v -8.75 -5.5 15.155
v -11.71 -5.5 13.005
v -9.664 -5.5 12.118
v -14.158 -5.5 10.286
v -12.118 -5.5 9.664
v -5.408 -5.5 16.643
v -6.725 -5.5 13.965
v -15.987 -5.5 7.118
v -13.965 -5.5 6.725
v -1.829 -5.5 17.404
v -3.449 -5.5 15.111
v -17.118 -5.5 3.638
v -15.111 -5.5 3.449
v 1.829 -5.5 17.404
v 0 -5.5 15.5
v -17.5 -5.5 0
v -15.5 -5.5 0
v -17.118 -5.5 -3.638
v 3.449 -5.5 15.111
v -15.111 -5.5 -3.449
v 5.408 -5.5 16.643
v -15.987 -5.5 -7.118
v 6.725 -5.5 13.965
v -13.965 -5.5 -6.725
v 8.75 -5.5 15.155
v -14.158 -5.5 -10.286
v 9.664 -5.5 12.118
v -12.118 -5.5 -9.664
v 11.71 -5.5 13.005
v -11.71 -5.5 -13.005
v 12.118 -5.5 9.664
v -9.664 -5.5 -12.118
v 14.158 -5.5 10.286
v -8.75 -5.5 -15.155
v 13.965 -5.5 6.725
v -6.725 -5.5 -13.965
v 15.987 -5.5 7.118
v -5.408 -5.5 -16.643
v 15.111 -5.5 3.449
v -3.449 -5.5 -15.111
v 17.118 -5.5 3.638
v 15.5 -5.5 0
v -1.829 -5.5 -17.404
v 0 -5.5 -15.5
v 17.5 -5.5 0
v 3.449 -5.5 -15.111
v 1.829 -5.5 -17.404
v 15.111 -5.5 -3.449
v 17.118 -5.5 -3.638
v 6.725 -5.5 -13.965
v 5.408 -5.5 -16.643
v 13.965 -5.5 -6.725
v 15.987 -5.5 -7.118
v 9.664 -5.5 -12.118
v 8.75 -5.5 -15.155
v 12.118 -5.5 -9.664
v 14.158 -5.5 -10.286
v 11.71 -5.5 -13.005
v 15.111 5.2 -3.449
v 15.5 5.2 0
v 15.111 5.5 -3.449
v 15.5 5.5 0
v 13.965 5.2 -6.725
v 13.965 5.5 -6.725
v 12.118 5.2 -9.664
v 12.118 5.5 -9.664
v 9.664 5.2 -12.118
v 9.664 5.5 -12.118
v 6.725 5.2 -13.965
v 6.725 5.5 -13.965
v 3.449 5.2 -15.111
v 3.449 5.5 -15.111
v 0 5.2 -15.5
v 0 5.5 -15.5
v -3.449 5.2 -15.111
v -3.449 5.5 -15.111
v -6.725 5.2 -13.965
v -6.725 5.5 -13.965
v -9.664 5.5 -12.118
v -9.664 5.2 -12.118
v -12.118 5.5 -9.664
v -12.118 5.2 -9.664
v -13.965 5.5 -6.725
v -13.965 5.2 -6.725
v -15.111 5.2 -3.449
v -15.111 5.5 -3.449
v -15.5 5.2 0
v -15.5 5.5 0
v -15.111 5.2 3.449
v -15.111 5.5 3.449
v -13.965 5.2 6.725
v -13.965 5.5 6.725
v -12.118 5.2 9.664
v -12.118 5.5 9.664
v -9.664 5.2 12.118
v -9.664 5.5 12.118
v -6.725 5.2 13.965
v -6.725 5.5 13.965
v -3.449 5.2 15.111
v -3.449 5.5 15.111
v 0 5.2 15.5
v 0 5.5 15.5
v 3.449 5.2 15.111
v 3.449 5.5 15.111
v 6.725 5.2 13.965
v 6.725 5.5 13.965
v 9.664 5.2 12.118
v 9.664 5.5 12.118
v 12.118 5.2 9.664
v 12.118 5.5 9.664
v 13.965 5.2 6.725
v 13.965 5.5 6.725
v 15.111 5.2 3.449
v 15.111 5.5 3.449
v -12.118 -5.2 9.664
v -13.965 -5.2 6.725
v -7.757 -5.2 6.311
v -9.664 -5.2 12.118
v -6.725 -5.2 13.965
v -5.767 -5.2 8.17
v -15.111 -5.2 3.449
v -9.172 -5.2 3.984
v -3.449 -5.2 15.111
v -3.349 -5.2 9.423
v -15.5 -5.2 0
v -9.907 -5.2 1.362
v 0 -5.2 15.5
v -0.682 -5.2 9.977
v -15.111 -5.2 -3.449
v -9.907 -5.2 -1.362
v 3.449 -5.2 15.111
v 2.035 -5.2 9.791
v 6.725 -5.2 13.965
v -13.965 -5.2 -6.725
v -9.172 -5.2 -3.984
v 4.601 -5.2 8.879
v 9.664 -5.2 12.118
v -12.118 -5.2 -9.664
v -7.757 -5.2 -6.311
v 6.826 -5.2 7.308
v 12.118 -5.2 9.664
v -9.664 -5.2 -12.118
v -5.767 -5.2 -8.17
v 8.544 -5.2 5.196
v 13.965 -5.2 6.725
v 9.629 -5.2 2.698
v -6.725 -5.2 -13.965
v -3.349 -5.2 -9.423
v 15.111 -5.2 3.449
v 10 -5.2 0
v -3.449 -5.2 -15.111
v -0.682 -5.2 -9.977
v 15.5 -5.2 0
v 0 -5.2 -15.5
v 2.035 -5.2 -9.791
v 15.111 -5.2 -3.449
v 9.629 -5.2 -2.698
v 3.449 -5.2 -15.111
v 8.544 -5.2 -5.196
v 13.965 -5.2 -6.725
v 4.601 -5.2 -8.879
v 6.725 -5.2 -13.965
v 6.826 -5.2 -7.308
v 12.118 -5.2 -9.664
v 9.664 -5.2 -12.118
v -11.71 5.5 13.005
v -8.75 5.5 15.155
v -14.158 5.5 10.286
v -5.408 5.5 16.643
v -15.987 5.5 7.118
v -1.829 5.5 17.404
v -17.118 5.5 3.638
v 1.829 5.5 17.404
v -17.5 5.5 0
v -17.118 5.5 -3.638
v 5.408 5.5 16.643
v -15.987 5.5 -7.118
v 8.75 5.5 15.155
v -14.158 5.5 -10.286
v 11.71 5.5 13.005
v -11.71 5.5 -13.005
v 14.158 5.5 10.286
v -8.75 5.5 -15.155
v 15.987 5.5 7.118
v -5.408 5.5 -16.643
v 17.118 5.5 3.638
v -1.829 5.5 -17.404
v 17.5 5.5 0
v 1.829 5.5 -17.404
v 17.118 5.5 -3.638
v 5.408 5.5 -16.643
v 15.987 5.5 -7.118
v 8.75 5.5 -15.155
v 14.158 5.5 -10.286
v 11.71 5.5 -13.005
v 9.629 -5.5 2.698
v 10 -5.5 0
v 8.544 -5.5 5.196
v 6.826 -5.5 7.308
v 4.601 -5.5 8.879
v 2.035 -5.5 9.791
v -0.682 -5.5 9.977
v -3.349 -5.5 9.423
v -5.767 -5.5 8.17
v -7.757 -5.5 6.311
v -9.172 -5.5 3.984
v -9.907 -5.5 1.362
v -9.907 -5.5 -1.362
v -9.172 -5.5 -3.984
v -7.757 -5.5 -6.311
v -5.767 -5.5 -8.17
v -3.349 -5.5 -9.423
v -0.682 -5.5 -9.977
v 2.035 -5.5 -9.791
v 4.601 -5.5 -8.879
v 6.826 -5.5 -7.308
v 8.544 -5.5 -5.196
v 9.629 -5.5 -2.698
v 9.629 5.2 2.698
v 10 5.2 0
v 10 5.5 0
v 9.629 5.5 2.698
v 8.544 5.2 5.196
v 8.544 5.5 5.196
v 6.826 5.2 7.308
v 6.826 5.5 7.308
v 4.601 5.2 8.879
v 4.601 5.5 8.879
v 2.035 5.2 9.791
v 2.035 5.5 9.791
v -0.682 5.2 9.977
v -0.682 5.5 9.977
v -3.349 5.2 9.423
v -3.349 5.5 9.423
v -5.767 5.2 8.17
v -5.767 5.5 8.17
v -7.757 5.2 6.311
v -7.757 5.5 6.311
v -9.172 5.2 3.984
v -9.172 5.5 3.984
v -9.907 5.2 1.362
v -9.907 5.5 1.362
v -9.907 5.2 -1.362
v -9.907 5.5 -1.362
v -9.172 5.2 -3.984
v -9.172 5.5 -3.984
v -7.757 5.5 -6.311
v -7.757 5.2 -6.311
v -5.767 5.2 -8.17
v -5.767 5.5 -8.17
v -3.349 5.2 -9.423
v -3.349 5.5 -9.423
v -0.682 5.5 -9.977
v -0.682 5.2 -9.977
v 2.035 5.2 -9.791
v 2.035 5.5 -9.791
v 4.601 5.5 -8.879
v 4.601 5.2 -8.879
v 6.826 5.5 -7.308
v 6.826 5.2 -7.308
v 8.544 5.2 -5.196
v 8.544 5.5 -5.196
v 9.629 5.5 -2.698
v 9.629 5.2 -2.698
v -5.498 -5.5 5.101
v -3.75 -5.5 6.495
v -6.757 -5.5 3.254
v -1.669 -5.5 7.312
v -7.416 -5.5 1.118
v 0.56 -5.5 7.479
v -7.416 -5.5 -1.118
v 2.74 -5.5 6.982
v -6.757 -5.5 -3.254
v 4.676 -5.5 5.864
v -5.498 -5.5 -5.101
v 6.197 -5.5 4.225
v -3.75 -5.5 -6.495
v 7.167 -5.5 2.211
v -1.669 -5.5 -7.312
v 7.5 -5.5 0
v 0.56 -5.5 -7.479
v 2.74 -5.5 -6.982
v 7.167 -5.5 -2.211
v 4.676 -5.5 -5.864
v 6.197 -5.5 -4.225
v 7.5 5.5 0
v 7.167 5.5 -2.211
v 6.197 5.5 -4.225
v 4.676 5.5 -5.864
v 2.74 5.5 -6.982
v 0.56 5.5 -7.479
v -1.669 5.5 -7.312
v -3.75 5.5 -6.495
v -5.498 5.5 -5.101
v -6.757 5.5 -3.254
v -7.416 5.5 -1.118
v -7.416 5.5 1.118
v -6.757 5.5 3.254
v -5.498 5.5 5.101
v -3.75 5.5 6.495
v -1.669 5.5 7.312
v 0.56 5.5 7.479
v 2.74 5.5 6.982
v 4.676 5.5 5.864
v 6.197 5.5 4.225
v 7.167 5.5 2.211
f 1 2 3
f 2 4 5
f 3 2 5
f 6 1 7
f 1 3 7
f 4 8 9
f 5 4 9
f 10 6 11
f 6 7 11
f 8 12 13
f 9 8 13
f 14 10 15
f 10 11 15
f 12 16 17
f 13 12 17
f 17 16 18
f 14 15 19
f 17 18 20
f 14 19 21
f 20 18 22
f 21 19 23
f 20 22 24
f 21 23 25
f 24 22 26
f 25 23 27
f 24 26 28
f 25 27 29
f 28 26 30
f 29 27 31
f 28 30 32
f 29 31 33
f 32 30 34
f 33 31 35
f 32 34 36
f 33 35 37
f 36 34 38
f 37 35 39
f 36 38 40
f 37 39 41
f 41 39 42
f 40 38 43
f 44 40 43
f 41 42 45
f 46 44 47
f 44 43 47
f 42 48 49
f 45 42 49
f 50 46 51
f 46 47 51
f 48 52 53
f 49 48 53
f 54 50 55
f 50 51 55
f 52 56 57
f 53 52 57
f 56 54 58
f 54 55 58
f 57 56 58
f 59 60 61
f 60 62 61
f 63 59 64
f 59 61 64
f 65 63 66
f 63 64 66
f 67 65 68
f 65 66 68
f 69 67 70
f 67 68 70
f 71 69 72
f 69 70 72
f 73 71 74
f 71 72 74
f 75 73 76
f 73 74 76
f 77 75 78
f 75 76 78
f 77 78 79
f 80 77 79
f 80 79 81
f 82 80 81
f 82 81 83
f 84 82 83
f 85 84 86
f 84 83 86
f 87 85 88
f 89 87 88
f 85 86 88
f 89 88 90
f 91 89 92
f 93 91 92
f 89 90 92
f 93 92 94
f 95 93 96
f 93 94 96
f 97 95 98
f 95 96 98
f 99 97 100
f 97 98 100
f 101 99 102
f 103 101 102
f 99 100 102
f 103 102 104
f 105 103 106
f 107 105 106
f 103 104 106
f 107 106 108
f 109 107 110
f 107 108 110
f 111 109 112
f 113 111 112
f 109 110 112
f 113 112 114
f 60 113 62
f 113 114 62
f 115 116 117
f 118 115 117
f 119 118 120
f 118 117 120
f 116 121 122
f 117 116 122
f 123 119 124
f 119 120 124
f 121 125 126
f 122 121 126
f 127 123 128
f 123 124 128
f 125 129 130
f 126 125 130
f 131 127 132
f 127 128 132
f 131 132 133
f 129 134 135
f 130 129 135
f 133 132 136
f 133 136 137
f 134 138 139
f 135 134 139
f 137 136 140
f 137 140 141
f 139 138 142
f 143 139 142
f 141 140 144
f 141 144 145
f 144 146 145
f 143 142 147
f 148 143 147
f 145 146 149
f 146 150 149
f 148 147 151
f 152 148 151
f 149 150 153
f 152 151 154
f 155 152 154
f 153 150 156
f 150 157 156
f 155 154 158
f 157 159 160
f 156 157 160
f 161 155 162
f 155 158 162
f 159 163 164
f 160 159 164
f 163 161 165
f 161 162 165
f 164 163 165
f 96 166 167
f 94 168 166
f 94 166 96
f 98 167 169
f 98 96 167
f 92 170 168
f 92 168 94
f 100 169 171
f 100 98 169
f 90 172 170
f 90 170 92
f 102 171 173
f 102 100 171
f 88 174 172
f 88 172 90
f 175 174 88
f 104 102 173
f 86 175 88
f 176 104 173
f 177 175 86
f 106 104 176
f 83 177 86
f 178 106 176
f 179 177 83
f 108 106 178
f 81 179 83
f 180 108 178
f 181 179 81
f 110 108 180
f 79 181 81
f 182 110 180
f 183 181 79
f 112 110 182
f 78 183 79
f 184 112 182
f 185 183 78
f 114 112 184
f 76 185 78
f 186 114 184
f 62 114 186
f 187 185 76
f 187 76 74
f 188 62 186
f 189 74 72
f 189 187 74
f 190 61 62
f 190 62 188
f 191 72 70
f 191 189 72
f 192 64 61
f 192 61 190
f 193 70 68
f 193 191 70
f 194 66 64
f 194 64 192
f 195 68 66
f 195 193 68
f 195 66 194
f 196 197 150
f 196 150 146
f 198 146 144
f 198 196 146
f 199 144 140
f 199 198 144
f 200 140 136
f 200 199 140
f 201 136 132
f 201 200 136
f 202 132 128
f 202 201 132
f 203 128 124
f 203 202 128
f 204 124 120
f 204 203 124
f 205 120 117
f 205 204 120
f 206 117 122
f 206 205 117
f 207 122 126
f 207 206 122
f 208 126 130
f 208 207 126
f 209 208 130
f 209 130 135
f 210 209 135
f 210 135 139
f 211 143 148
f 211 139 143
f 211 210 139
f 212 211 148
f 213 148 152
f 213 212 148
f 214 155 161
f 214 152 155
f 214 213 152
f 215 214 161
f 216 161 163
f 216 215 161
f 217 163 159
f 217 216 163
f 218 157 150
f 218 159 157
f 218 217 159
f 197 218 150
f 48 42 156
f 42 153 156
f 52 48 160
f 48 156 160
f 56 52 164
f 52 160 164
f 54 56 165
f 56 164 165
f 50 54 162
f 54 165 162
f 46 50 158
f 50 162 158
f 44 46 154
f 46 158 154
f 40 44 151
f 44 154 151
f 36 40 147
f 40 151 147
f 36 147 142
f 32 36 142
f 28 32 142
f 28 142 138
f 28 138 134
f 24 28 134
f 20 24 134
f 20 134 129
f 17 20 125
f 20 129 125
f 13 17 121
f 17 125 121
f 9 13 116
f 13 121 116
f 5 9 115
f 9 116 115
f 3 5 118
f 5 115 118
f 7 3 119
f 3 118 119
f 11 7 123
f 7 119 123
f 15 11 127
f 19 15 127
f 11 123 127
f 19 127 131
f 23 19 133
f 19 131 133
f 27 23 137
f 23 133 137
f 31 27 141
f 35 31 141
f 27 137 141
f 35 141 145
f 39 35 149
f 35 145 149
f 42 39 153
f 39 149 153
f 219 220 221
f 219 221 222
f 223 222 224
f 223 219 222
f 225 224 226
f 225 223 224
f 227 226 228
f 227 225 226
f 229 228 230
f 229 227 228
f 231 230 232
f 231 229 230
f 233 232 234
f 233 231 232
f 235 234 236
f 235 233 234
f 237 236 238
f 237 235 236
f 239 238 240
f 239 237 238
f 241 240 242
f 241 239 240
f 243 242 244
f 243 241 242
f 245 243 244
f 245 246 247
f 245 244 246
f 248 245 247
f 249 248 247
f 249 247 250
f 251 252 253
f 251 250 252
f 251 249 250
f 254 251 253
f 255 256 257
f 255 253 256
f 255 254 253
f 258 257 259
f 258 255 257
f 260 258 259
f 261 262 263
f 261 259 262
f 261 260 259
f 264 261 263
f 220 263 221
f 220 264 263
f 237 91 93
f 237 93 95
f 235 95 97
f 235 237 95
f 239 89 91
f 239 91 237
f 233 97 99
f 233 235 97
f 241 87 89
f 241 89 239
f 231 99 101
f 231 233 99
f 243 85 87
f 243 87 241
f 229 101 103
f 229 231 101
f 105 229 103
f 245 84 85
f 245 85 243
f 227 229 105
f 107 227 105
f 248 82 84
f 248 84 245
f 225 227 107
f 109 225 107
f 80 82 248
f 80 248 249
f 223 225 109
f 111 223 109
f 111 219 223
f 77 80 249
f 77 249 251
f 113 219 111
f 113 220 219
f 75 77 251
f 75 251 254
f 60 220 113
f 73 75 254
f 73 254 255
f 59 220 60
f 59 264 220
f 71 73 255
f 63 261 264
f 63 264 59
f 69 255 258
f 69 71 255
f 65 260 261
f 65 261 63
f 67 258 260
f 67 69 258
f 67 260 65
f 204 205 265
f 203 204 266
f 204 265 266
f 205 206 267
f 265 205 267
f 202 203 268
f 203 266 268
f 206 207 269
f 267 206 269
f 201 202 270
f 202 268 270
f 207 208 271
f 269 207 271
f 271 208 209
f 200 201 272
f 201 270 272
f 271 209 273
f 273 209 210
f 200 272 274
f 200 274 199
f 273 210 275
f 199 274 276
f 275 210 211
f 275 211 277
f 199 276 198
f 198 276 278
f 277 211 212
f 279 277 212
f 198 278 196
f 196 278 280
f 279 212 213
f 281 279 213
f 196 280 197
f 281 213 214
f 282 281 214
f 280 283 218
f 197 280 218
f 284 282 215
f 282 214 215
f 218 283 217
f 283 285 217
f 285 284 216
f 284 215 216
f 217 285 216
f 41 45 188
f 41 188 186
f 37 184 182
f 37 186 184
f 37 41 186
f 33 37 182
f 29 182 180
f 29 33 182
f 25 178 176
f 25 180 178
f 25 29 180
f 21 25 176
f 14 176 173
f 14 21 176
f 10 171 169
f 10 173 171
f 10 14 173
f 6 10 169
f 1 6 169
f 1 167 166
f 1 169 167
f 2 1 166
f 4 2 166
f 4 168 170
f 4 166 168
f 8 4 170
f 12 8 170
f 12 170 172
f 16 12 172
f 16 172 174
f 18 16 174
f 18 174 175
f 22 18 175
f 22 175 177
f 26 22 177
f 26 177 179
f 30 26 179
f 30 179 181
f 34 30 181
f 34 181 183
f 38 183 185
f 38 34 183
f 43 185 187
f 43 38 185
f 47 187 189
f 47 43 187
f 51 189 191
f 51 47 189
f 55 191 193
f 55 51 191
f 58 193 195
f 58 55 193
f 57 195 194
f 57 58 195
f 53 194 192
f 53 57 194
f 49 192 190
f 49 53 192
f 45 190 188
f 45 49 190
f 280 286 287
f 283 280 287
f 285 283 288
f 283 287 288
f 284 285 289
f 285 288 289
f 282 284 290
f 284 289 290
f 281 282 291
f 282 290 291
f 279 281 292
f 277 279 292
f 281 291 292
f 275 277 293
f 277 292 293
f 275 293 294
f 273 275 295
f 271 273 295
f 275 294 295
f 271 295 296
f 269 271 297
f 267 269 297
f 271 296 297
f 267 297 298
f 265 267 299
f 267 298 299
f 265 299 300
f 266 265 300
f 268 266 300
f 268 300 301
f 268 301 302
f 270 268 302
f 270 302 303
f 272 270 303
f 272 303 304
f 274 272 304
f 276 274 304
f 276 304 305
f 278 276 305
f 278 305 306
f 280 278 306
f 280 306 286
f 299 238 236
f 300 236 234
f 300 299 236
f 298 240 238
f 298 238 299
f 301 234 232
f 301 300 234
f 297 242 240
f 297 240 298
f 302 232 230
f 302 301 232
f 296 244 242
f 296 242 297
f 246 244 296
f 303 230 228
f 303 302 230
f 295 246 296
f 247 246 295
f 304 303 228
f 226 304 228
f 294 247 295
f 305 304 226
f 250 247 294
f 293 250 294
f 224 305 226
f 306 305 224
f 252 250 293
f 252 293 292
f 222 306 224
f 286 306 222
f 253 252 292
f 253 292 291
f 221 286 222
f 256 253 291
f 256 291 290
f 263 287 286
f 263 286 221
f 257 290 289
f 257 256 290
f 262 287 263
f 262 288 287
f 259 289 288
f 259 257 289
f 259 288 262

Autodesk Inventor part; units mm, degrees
ref_plane "YZ Plane" through (0, 0, 0) normal (1, 0, 0) x (0, 1, 0)
ref_plane "XZ Plane" through (0, 0, 0) normal (0, 1, 0) x (-1, 0, 0)
ref_plane "XY Plane" through (0, 0, 0) normal (0, 0, 1) x (1, 0, 0)
sketch "Sketch1" plane through (0, 0, 0) normal (0, 0, 1) x (1, 0, 0)
  line L0 (0, 0) -> (0, 10) construction
  line L1 (0, 0) -> (10, 0) construction
  line L2 (7.5, 5.5) -> (10, 5.5)
  line L3 (10, 5.5) -> (10, -5.5)
  line L4 (10, -5.5) -> (7.5, -5.5)
  line L5 (7.5, -5.5) -> (7.5, 5.5)
  line L6 (10, 5.2) -> (15.5, 5.2)
  line L7 (15.5, 5.2) -> (15.5, -5.2)
  line L8 (15.5, -5.2) -> (10, -5.2)
  line L9 (10, -5.2) -> (10, 5.2)
  line L10 (15.5, 5.5) -> (17.5, 5.5)
  line L11 (17.5, 5.5) -> (17.5, -5.5)
  line L12 (17.5, -5.5) -> (15.5, -5.5)
  line L13 (15.5, -5.5) -> (15.5, 5.5)
  dimension "d0" = 10
  dimension "d1" = 90
  dimension "d2" = 2.5
  dimension "d3" = 11
  dimension "d5" = 10.4
  dimension "d6" = 0.3
  dimension "d7" = 5.5
  dimension "d8" = 2
  dimension "d9" = 11
  dimension "d10" = 7.5
  dimension "d11" = 5.5
  dimension "d13" = 17.5
revolve "Revolution1" add sketch "Sketch1" angle 360 about axis through (0, 0, 0) along (0, 1, 0)
equation "\"d5\" = d9 - 2 * d6"
equation "\"d7\" = 0.5 * d3"
equation "\"d9\" = d3"
equation "\"d11\" = d7"
properties part number "6202-2rs_15x35x11" material "Steel"
